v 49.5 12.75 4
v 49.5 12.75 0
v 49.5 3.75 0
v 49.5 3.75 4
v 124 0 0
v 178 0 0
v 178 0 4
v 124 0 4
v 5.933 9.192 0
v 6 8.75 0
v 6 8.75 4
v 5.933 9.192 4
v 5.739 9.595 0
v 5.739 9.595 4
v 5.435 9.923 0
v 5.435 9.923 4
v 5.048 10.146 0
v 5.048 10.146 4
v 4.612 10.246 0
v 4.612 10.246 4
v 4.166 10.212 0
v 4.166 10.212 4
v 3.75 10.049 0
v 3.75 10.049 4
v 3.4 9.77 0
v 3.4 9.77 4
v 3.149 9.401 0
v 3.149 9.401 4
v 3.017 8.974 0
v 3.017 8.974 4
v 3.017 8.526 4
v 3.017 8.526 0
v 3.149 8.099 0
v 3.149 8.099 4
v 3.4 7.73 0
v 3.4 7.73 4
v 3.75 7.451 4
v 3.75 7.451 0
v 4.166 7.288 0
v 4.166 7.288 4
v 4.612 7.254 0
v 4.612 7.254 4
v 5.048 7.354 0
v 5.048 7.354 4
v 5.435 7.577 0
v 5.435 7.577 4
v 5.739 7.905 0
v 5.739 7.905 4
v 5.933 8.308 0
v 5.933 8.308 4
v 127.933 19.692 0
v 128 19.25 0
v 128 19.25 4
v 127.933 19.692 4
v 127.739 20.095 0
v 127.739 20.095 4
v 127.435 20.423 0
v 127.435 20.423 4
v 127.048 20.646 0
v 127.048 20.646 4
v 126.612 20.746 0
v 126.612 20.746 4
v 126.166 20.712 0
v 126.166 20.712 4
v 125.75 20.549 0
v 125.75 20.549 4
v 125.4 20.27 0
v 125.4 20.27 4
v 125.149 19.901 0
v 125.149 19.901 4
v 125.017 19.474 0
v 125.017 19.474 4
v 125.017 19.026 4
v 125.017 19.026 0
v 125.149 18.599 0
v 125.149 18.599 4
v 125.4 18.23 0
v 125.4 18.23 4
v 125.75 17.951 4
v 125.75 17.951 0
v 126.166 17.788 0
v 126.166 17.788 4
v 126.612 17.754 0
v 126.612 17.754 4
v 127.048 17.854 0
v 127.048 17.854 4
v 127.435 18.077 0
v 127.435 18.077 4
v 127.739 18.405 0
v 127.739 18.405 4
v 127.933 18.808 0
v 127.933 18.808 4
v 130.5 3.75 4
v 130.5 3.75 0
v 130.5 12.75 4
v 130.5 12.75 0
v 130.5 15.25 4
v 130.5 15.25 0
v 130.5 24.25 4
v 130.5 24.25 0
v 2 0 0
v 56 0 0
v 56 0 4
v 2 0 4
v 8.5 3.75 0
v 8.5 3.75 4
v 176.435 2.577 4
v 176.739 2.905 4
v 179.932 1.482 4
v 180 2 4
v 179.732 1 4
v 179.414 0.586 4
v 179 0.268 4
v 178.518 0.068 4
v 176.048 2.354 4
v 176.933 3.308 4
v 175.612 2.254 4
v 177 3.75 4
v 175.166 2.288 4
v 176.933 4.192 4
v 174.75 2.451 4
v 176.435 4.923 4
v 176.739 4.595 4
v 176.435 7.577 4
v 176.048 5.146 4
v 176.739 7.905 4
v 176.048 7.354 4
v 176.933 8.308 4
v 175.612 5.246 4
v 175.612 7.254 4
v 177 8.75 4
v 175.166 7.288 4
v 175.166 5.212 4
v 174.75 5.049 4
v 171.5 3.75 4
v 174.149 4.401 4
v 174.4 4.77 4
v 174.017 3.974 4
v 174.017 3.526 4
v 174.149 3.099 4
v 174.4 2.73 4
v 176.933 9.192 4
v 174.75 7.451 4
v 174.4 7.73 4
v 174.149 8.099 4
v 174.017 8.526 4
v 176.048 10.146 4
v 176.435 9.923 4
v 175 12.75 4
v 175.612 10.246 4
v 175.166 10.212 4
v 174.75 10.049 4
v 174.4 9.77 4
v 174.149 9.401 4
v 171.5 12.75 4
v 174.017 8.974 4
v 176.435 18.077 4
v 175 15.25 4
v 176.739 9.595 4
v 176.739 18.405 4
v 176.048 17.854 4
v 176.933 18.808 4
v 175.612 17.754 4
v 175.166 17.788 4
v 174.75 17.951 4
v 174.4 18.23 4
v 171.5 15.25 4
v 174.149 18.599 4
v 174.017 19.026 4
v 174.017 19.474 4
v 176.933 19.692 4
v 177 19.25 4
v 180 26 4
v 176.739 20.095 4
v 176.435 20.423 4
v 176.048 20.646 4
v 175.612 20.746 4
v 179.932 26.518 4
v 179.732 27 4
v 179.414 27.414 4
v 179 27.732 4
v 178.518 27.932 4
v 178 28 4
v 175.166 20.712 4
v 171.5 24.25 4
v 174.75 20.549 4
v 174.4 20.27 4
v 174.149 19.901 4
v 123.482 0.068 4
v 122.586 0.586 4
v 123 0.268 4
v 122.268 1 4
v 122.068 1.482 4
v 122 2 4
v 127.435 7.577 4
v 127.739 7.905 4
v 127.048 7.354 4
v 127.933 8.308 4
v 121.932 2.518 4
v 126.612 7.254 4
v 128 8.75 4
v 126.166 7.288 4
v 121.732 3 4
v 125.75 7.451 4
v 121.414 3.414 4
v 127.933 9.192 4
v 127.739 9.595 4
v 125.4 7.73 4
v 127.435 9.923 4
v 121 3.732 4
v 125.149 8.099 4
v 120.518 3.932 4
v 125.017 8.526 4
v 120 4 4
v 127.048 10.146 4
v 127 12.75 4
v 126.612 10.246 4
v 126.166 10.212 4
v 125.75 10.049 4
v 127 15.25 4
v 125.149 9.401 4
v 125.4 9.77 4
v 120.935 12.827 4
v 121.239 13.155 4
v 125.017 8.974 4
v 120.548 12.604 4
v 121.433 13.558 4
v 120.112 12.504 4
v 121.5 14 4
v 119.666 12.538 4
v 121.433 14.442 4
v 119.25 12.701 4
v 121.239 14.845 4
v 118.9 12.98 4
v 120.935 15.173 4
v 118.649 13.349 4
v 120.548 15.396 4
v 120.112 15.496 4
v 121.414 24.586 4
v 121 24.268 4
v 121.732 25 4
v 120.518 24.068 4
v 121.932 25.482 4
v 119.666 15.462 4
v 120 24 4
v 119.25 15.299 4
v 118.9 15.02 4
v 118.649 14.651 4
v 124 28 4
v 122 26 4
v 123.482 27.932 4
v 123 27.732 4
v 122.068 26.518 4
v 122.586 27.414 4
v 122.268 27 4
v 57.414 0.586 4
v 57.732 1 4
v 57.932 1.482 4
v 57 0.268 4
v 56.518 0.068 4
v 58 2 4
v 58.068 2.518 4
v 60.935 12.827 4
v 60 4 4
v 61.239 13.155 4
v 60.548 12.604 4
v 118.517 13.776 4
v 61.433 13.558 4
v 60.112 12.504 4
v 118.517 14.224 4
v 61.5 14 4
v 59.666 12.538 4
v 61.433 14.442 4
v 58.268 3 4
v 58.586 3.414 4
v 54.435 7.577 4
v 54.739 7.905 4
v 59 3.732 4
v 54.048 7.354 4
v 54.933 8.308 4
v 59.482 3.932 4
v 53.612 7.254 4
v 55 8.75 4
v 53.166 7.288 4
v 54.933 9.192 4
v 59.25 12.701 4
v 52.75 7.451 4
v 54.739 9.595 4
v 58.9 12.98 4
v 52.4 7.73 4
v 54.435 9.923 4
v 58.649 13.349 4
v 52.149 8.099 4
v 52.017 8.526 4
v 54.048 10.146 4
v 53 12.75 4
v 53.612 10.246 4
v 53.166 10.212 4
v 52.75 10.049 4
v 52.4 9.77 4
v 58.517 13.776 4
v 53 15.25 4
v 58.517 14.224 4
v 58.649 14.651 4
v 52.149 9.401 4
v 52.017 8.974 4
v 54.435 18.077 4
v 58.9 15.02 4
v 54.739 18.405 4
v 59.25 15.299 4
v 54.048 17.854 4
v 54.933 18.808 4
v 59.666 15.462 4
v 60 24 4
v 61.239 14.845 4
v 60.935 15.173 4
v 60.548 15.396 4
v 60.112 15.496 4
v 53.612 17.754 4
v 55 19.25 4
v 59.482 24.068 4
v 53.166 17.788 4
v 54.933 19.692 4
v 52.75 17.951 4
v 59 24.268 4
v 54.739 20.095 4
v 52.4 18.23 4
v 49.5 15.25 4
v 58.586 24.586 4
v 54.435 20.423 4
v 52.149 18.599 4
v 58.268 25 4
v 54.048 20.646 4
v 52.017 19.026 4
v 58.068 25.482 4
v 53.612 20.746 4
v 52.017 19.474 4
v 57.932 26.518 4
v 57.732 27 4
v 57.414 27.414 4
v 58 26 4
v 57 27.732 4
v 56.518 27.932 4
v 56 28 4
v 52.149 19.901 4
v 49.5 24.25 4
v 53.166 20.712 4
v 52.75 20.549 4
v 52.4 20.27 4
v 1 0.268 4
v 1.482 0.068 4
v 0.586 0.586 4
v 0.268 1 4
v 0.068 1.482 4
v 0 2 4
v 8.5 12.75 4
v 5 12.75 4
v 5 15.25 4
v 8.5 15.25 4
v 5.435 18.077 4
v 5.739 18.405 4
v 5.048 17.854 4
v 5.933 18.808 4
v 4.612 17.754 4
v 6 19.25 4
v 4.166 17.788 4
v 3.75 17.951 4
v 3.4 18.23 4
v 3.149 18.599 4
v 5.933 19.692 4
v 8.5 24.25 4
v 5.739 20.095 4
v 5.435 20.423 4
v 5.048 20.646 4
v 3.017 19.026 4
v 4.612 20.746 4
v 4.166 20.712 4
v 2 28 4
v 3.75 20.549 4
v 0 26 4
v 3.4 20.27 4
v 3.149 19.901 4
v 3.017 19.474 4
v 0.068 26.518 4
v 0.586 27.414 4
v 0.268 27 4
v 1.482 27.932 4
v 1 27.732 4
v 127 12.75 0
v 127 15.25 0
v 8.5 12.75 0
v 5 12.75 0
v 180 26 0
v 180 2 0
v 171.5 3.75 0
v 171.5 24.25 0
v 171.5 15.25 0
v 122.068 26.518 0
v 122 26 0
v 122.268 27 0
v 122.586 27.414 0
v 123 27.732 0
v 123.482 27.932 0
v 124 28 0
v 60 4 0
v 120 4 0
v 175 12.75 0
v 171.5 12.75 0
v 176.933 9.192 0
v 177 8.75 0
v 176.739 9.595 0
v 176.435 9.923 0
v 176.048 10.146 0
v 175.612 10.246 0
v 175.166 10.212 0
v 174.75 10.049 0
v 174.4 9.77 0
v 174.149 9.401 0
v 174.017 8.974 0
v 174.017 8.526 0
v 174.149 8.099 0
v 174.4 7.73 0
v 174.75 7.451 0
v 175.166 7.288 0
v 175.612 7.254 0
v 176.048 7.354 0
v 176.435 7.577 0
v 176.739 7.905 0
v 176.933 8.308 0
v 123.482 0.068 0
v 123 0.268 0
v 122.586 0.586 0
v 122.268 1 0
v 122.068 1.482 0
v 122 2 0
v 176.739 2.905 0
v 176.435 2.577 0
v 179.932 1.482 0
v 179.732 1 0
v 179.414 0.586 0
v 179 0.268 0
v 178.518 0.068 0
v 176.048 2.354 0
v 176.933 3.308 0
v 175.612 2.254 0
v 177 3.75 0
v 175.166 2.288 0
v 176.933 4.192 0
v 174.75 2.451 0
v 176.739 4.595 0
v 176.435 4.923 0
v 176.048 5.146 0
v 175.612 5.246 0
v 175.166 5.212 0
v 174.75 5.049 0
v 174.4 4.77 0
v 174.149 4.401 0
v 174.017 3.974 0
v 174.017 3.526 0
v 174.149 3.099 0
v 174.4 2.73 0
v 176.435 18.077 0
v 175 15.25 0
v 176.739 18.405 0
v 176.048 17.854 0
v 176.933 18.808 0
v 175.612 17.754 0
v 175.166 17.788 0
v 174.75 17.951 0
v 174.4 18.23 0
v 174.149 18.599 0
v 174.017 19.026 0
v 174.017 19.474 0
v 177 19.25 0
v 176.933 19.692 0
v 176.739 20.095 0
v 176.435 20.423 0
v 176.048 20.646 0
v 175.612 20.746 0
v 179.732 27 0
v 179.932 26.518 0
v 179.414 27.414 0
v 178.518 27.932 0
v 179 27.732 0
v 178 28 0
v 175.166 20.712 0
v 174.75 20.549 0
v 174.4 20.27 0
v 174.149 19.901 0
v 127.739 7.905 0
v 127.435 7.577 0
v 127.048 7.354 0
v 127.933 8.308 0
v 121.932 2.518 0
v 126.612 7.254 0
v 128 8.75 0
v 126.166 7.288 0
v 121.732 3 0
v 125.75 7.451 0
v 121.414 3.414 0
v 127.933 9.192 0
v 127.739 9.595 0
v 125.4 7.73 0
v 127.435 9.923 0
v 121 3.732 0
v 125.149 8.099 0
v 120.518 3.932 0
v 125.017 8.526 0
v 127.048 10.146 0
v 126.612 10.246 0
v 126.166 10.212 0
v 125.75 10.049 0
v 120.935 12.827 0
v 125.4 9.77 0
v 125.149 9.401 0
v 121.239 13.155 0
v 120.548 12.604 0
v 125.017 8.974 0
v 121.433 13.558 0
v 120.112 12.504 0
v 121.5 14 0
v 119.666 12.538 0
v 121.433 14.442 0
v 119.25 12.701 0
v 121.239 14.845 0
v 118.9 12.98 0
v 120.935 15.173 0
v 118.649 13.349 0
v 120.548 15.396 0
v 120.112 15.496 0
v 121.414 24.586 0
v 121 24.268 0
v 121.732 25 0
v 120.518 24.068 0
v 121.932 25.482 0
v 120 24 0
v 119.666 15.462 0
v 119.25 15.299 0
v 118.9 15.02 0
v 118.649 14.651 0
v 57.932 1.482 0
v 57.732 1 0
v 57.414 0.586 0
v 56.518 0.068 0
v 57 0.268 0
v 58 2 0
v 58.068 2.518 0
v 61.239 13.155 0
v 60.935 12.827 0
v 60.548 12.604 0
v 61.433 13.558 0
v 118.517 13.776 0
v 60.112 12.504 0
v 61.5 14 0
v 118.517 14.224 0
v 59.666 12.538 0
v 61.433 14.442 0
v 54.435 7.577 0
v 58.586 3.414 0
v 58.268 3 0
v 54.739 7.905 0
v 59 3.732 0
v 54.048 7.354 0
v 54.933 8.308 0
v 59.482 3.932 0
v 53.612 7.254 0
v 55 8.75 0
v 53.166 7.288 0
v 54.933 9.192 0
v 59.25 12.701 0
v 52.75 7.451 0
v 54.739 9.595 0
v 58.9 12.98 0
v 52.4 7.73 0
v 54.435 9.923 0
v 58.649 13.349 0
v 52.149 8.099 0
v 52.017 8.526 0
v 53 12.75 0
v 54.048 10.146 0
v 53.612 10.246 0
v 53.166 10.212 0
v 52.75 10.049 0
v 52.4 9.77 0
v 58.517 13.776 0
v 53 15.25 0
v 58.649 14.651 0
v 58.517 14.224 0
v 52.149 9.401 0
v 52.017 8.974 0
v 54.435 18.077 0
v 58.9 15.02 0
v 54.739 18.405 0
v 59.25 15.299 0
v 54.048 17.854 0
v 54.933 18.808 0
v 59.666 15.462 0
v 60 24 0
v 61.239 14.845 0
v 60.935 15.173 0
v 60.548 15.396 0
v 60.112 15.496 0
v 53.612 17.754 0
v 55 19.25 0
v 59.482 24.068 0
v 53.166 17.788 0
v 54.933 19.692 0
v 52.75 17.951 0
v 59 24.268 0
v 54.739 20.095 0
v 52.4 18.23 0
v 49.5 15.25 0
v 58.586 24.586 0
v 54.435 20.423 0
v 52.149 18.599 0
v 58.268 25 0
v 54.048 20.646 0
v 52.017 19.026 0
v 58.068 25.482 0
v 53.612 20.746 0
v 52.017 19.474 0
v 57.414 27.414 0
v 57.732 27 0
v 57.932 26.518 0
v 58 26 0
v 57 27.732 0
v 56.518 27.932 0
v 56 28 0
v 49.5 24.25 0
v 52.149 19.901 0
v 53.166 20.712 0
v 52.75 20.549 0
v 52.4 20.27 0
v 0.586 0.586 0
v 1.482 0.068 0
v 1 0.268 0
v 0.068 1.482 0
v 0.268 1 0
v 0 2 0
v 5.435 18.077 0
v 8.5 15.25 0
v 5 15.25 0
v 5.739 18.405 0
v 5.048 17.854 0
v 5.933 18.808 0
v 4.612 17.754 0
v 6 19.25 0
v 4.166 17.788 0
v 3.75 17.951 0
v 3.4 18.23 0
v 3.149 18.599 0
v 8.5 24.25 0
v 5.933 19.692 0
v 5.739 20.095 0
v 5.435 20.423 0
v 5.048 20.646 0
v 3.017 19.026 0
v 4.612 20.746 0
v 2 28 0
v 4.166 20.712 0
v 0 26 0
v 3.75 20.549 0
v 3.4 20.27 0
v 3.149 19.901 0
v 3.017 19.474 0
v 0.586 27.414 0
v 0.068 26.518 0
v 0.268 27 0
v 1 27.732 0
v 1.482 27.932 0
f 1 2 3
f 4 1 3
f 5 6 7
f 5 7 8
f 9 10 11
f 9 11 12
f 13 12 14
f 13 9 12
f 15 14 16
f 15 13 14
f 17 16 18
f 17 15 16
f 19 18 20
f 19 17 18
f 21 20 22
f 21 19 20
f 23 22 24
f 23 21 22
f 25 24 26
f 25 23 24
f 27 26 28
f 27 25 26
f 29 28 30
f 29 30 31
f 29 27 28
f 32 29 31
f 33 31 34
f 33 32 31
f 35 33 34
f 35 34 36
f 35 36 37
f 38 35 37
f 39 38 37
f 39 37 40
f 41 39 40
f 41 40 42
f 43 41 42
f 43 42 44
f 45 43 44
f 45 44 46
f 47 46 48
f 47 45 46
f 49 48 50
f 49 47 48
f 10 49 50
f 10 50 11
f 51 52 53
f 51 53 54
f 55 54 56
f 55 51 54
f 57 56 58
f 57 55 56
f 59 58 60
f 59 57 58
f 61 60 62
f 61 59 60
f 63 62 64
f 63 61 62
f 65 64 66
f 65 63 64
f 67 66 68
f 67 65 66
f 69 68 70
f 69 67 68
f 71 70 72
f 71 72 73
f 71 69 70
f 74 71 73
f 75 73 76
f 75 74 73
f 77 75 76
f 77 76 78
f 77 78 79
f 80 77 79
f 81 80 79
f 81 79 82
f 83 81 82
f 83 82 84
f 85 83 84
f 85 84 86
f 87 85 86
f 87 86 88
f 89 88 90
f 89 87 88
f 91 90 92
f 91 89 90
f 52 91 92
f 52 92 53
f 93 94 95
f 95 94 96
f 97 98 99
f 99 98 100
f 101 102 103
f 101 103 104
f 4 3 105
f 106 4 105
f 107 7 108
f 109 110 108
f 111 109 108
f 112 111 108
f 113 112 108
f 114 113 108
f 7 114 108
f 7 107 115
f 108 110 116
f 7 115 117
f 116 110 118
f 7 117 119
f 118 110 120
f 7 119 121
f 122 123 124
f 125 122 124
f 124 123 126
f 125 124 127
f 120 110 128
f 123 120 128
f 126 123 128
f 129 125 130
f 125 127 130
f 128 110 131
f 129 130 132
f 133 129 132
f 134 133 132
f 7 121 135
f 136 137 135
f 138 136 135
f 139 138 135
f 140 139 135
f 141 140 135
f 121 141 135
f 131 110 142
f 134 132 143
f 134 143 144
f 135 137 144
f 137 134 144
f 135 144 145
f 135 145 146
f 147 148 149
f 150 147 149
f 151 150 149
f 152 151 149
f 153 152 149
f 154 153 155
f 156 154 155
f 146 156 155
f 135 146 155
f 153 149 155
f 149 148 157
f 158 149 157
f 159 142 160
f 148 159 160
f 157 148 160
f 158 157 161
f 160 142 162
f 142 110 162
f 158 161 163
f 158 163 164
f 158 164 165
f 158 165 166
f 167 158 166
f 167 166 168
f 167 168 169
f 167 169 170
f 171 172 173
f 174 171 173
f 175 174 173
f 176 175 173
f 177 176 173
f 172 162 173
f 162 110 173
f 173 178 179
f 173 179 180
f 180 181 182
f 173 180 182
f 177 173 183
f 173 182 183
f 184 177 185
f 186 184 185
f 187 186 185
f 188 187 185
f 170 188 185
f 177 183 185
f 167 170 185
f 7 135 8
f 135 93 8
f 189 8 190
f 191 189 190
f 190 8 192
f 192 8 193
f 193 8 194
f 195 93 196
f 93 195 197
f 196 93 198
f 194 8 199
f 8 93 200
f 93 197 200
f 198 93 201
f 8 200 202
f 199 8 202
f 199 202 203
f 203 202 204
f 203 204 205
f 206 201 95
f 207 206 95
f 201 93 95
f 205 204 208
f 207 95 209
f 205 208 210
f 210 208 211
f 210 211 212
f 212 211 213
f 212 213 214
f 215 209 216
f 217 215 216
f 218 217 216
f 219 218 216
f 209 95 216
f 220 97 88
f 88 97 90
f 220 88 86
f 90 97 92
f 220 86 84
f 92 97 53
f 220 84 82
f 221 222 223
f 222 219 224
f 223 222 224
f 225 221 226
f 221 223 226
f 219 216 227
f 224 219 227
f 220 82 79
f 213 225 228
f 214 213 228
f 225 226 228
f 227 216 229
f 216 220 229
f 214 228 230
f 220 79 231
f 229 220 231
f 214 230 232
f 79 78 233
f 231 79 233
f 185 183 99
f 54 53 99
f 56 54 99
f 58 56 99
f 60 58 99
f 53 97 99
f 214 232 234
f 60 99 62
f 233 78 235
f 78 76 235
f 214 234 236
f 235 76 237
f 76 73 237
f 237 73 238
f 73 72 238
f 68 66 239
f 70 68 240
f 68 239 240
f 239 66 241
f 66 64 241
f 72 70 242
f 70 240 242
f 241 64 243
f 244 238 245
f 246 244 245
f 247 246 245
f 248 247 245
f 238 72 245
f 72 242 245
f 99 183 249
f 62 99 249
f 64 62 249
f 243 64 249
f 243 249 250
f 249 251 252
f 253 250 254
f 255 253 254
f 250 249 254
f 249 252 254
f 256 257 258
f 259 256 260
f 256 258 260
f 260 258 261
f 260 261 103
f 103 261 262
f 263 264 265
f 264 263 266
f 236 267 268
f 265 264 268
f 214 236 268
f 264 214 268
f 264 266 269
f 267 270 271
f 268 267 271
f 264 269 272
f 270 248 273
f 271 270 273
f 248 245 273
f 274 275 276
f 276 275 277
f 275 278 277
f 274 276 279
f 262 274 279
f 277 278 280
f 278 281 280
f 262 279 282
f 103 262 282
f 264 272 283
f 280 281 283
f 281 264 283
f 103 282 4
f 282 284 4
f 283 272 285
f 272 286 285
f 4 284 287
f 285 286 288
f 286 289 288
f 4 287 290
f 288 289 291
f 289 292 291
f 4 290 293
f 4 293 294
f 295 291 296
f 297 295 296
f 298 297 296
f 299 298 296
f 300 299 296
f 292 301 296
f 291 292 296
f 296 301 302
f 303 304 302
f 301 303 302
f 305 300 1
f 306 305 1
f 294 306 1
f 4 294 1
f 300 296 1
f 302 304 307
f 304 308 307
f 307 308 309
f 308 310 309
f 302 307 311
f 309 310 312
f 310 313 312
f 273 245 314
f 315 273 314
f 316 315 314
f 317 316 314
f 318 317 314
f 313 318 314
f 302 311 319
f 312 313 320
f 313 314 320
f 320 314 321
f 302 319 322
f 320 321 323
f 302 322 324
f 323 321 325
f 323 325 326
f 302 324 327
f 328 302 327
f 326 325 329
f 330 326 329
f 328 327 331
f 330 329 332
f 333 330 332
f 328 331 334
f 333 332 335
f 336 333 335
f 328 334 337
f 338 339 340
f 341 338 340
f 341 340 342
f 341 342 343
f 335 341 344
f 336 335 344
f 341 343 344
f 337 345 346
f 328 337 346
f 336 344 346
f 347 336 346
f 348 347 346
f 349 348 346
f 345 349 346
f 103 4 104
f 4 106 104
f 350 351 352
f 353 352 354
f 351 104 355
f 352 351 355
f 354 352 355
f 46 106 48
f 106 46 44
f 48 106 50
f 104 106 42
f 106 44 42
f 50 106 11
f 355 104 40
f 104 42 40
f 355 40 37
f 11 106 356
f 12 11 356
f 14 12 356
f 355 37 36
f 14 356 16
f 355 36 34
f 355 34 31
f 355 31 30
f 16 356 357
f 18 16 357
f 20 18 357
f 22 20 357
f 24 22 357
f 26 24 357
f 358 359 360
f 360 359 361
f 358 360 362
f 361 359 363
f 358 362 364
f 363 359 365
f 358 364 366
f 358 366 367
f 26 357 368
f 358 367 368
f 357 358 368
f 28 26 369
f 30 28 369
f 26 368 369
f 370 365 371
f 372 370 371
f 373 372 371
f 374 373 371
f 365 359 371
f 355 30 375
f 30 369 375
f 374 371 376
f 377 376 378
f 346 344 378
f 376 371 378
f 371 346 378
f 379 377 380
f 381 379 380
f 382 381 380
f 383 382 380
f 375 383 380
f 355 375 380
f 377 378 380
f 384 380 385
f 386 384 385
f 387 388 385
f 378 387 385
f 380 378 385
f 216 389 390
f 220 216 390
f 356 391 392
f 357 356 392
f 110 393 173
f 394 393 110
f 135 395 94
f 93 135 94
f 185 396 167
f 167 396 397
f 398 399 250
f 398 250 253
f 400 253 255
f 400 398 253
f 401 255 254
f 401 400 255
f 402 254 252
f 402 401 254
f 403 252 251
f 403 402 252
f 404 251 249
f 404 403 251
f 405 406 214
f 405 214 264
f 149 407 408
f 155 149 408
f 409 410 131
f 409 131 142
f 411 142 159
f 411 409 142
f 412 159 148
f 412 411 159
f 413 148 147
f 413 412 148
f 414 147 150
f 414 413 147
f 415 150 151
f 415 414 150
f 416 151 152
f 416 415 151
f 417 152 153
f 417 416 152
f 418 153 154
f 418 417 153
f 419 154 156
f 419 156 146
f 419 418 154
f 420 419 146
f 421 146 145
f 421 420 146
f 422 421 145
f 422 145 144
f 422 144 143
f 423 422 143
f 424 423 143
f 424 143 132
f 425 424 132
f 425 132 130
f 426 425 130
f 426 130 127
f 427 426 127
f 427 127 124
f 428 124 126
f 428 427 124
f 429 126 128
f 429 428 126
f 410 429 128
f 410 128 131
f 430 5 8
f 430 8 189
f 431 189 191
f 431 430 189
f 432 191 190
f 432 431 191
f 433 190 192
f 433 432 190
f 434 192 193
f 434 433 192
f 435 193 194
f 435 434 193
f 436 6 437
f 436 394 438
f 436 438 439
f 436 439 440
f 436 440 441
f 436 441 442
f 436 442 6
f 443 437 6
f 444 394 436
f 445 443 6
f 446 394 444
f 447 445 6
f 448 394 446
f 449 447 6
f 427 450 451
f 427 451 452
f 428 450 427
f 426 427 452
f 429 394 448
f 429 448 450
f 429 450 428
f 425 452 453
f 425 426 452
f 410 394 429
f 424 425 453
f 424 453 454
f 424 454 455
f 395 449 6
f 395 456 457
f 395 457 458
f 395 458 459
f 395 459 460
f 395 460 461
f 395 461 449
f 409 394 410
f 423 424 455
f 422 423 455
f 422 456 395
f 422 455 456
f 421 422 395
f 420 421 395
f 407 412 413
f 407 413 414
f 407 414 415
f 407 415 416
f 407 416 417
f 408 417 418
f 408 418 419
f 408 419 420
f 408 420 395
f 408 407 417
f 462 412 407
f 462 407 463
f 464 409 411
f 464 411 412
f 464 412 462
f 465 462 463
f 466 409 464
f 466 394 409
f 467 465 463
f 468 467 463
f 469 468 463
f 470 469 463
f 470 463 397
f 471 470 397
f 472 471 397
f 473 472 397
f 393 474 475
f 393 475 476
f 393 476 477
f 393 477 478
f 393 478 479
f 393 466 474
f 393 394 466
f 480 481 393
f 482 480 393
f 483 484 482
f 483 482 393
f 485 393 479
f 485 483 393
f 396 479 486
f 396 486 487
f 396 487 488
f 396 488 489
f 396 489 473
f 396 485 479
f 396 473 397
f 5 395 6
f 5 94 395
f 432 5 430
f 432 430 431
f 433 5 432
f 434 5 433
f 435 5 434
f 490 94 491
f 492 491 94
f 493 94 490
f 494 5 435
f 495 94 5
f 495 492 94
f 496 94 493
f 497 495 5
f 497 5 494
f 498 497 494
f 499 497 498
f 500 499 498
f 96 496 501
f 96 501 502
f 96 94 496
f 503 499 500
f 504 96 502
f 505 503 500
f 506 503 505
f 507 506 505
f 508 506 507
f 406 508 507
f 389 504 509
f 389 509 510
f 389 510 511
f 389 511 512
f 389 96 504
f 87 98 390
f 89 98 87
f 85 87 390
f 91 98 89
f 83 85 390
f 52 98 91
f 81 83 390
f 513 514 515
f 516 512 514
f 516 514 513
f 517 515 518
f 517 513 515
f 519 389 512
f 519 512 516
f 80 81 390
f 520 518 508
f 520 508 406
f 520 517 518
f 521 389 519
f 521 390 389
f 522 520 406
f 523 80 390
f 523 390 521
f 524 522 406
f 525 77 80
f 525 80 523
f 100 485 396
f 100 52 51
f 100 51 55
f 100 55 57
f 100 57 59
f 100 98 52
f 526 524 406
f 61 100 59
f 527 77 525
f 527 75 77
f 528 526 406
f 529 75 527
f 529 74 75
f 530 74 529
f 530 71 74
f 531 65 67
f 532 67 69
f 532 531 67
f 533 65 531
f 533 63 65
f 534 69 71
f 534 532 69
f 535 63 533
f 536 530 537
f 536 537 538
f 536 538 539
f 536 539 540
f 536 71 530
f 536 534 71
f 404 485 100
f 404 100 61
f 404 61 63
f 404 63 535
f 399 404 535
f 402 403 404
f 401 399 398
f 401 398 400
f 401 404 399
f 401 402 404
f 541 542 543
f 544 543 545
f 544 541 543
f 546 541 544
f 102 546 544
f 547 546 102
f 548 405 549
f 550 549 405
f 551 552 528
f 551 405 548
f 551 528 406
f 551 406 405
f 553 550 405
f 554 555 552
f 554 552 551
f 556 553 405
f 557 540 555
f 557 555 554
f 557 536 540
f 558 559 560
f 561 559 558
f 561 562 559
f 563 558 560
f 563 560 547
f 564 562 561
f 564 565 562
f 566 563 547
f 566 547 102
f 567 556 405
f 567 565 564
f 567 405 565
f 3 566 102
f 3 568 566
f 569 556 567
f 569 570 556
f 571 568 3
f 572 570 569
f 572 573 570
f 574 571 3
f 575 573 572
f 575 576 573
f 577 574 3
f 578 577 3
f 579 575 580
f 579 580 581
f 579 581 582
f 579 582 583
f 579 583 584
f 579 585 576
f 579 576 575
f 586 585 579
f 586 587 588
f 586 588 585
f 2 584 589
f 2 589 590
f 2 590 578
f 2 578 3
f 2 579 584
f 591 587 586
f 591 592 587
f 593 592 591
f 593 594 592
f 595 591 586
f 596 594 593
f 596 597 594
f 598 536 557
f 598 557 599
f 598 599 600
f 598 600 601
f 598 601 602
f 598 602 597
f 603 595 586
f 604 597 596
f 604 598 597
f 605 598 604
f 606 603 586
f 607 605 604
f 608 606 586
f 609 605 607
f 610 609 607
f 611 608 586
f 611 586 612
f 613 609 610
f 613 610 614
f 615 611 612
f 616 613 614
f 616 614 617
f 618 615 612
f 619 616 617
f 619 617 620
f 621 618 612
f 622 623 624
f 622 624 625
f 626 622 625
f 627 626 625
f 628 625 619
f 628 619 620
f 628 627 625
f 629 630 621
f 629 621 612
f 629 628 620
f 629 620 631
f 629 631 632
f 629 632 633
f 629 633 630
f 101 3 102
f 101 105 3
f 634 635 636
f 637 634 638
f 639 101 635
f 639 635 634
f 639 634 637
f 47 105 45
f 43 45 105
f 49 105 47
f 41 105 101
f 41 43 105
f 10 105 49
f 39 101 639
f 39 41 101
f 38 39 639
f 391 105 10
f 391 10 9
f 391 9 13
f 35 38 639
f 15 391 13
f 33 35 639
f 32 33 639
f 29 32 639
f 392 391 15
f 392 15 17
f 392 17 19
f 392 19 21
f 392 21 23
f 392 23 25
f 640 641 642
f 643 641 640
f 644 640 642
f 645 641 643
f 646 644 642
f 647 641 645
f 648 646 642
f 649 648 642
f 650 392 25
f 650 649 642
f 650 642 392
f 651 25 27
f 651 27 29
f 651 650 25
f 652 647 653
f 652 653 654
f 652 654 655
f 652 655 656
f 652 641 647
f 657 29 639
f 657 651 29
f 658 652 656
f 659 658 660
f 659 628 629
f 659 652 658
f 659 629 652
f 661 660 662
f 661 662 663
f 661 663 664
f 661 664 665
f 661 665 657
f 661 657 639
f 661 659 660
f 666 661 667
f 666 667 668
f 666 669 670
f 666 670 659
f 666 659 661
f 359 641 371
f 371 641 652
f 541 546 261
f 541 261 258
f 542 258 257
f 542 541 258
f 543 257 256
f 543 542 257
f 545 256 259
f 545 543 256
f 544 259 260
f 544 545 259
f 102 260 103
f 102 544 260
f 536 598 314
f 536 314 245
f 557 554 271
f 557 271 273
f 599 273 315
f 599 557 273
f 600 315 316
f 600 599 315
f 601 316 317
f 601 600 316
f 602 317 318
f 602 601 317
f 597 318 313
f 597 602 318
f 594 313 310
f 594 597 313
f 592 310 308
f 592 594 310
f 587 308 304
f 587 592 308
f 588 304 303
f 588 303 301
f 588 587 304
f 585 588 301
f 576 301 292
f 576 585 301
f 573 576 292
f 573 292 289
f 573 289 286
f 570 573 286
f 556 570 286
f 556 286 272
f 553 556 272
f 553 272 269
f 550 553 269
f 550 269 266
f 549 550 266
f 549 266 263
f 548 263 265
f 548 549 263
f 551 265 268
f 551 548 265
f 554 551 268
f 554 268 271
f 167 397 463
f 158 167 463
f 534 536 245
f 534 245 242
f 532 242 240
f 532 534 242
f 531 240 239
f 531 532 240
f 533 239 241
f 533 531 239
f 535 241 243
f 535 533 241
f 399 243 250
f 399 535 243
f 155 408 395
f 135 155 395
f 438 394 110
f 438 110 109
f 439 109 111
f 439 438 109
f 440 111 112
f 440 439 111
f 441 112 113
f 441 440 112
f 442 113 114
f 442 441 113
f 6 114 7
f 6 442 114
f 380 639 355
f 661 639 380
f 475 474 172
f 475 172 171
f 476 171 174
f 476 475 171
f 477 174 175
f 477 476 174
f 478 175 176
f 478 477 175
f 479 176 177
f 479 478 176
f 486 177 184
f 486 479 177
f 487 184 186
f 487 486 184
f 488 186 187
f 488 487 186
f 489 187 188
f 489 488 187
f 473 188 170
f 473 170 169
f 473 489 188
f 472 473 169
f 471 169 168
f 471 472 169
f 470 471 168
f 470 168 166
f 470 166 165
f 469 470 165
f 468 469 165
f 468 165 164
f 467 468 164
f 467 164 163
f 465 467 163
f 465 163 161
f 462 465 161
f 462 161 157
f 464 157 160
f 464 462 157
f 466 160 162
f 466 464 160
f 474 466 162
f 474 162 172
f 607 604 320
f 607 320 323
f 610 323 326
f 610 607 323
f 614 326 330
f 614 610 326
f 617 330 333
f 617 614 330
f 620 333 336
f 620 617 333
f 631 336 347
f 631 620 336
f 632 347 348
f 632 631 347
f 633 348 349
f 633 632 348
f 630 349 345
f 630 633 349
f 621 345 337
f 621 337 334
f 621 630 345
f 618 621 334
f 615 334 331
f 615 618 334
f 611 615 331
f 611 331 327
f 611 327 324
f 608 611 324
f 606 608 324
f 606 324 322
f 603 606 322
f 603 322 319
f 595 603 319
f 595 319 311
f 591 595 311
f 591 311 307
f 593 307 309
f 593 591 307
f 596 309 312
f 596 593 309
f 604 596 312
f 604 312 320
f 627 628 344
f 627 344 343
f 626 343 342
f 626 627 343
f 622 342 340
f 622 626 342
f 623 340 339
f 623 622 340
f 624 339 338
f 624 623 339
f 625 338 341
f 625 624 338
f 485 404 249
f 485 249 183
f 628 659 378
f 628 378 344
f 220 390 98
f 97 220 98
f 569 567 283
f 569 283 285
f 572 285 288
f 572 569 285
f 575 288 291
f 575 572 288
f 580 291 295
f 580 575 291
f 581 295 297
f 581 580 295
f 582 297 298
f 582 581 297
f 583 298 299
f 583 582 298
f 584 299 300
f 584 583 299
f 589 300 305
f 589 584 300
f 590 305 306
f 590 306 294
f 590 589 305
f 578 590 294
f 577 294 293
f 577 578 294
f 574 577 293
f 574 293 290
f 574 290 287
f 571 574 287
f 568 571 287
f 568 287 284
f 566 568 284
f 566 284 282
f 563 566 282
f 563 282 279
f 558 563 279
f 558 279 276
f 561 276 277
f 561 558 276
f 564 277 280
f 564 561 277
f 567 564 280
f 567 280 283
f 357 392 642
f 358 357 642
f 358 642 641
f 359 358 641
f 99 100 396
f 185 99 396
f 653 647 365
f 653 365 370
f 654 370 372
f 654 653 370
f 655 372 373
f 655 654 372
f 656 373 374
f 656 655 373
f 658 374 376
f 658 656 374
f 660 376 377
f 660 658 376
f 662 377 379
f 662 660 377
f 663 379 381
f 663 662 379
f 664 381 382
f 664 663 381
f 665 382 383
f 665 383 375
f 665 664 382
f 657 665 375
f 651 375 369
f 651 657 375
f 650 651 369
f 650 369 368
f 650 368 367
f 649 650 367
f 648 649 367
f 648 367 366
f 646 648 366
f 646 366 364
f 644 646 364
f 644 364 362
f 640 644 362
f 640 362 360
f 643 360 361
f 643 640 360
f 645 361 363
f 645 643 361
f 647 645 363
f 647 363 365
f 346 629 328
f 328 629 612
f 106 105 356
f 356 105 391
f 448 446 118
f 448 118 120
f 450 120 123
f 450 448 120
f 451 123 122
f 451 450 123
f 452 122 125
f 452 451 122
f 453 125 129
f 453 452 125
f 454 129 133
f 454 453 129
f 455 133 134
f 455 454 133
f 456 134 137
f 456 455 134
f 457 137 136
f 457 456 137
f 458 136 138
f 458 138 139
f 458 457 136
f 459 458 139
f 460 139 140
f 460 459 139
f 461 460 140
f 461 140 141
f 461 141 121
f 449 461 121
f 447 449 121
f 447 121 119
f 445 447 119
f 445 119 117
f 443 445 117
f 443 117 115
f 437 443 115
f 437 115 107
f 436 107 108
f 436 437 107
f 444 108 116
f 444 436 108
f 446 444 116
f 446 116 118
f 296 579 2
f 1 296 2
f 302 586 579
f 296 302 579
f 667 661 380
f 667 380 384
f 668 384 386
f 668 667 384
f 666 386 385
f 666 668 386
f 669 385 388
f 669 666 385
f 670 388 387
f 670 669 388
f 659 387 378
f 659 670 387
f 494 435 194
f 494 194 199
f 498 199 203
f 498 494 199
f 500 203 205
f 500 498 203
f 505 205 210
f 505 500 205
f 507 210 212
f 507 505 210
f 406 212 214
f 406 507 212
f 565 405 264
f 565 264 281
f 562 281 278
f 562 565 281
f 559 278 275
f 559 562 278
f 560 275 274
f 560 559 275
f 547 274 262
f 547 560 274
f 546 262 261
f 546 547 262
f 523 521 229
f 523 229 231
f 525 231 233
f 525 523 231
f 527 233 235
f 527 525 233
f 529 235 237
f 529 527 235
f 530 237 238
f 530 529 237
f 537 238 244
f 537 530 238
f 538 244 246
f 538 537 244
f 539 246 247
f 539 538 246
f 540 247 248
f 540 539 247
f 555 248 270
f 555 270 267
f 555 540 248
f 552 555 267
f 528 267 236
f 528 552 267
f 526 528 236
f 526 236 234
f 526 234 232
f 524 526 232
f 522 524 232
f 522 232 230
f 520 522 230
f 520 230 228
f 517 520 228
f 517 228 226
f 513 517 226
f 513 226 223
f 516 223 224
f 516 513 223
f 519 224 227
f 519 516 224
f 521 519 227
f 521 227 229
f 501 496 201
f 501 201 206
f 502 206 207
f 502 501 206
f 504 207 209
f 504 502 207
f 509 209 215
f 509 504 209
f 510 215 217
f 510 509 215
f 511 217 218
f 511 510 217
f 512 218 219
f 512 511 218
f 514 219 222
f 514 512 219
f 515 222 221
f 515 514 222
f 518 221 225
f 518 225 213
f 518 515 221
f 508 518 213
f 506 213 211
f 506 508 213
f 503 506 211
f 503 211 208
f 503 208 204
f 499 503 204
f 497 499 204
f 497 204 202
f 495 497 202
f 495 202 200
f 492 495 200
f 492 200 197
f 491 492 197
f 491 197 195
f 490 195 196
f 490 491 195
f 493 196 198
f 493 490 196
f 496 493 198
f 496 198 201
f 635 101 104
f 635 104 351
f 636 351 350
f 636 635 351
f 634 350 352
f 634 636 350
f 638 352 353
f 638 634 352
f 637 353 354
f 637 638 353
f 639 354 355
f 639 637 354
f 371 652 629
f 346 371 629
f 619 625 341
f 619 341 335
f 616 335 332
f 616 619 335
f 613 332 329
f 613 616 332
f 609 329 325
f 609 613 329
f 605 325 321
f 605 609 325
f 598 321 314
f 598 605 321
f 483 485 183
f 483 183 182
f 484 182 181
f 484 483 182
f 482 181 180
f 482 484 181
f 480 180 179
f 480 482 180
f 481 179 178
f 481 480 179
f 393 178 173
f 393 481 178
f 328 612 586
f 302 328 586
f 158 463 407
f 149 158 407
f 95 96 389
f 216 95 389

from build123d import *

# Parameters (mm, degrees)
SKETCH1_R           = 1.5
BOSS_EXTRUDE1_DEPTH = 4


with BuildPart() as part:
    # Sketch1 → Boss-Extrude1 (new body)
    with BuildSketch(Plane.XY):
        with BuildLine():
            Line((0, 2), (0, 26))
            ThreePointArc((0, 26), (0.585786438, 27.414213562), (2, 28))
            Line((2, 28), (56, 28))
            ThreePointArc((56, 28), (57.414213562, 27.414213562), (58, 26))
            ThreePointArc((58, 26), (58.585786438, 24.585786438), (60, 24))
            Line((60, 24), (120, 24))
            ThreePointArc((120, 24), (121.414213562, 24.585786438), (122, 26))
            ThreePointArc((122, 26), (122.585786438, 27.414213562), (124, 28))
            Line((124, 28), (178, 28))
            ThreePointArc((178, 28), (179.414213562, 27.414213562), (180, 26))
            Line((180, 26), (180, 2))
            ThreePointArc((180, 2), (179.414213562, 0.585786438), (178, 0))
            Line((178, 0), (124, 0))
            ThreePointArc((124, 0), (122.585786438, 0.585786438), (122, 2))
            ThreePointArc((122, 2), (121.414213562, 3.414213562), (120, 4))
            Line((120, 4), (60, 4))
            ThreePointArc((60, 4), (58.585786438, 3.414213562), (58, 2))
            ThreePointArc((58, 2), (57.414213562, 0.585786438), (56, 0))
            Line((56, 0), (2, 0))
            ThreePointArc((2, 0), (0.585786438, 0.585786438), (0, 2))
        make_face()
        with Locations((53.5, 19.25)):
            Circle(SKETCH1_R, mode=Mode.SUBTRACT)
        with Locations((53.5, 8.75)):
            Circle(SKETCH1_R, mode=Mode.SUBTRACT)
        with Locations((4.5, 19.25)):
            Circle(SKETCH1_R, mode=Mode.SUBTRACT)
        with Locations((4.5, 8.75)):
            Circle(SKETCH1_R, mode=Mode.SUBTRACT)
        with Locations((175.5, 19.25)):
            Circle(SKETCH1_R, mode=Mode.SUBTRACT)
        with Locations((175.5, 8.75)):
            Circle(SKETCH1_R, mode=Mode.SUBTRACT)
        with Locations((126.5, 19.25)):
            Circle(SKETCH1_R, mode=Mode.SUBTRACT)
        with Locations((126.5, 8.75)):
            Circle(SKETCH1_R, mode=Mode.SUBTRACT)
        with Locations((60, 14)):
            Circle(SKETCH1_R, mode=Mode.SUBTRACT)
        with Locations((120, 14)):
            Circle(SKETCH1_R, mode=Mode.SUBTRACT)
        with Locations((175.5, 3.75)):
            Circle(SKETCH1_R, mode=Mode.SUBTRACT)
        Polygon((8.5, 3.75), (8.5, 12.75), (5, 12.75), (5, 15.25), (8.5, 15.25), (8.5, 24.25), (49.5, 24.25), (49.5, 15.25), (53, 15.25), (53, 12.75), (49.5, 12.75), (49.5, 3.75), align=None, mode=Mode.SUBTRACT)
        Polygon((130.5, 3.75), (130.5, 12.75), (127, 12.75), (127, 15.25), (130.5, 15.25), (130.5, 24.25), (171.5, 24.25), (171.5, 15.25), (175, 15.25), (175, 12.75), (171.5, 12.75), (171.5, 3.75), align=None, mode=Mode.SUBTRACT)
    extrude(amount=BOSS_EXTRUDE1_DEPTH)


solid = part.part
